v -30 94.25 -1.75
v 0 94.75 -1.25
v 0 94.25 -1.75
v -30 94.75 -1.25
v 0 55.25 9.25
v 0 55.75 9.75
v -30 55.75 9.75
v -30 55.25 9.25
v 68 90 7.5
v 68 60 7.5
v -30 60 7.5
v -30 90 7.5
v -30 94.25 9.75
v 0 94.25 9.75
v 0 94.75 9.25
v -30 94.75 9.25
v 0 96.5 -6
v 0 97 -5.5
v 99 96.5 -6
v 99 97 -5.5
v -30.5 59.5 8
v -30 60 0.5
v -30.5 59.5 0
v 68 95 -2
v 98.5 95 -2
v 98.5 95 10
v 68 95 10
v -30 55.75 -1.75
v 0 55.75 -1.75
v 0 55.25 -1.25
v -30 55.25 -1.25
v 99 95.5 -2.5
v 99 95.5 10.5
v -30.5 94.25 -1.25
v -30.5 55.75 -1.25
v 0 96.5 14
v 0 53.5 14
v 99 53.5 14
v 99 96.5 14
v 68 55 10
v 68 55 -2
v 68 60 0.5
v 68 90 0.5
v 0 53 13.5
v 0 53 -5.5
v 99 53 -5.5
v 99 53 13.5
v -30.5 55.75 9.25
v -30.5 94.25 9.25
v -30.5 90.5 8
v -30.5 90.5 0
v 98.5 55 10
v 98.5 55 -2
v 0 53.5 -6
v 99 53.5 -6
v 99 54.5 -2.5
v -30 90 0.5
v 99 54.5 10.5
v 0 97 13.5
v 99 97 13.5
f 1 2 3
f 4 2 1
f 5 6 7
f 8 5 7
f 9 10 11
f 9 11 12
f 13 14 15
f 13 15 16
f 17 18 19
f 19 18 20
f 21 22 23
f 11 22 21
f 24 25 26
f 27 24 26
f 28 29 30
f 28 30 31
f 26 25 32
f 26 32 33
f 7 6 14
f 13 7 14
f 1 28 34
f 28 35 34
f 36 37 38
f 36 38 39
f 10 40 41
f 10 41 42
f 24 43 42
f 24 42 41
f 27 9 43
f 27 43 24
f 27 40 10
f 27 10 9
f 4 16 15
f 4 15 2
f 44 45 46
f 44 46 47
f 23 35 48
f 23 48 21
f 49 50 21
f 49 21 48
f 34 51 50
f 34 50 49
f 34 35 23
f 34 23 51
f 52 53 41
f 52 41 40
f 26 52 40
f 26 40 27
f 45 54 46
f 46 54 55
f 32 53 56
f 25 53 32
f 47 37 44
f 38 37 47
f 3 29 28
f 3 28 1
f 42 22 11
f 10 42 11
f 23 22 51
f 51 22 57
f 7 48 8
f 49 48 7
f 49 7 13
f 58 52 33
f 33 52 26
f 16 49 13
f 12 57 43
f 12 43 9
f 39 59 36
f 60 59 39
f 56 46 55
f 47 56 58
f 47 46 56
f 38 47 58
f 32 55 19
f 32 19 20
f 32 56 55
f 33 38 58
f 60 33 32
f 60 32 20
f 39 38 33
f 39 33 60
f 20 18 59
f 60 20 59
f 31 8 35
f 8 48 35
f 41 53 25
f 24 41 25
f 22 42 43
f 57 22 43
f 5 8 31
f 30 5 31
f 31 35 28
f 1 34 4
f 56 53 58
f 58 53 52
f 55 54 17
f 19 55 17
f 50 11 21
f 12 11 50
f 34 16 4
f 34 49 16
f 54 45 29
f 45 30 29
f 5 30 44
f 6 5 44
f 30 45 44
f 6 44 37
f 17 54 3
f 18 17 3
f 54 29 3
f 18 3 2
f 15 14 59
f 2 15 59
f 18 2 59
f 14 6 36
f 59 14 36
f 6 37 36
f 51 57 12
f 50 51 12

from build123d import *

# Parameters (mm, degrees)
SKETCH086_W     = 44
SKETCH086_H     = 20
PAD047_DEPTH    = 99
SKETCH087_W     = 39.5
SKETCH087_H     = 11.5
PAD048_DEPTH    = 30.5
SKETCH088_W     = 30
SKETCH088_H     = 7
POCKET031_DEPTH = 129.5
SKETCH089_W     = 40
SKETCH089_H     = 12
POCKET032_DEPTH = 31
CHAMFER051_SIZE = 0.5
CHAMFER052_SIZE = 0.5
CHAMFER053_SIZE = 0.5


with BuildPart() as part:
    # Sketch086 → Pad047 (new body)
    with BuildSketch(Plane.YZ):
        Rectangle(SKETCH086_W, SKETCH086_H)
    extrude(amount=PAD047_DEPTH)

    # Sketch087 (on Face5 of Pad047) → Pad048 (join)
    with BuildSketch(Plane(origin=(0, 0, 0), x_dir=(0, 1, 0), z_dir=(-1, 0, 0))):
        Rectangle(SKETCH087_W, SKETCH087_H)
    extrude(amount=PAD048_DEPTH)

    # Sketch088 (on Face5 of Pad048) → Pocket031 (cut)
    with BuildSketch(Plane.YZ.offset(99)):
        Rectangle(SKETCH088_W, SKETCH088_H)
    extrude(amount=-POCKET031_DEPTH, mode=Mode.SUBTRACT)

    # Sketch089 (on Face5 of Pocket031) → Pocket032 (cut)
    with BuildSketch(Plane.YZ.offset(99)):
        Rectangle(SKETCH089_W, SKETCH089_H)
    extrude(amount=-POCKET032_DEPTH, mode=Mode.SUBTRACT)

    # Chamfer051
    chamfer051_edges = [part.edges().sort_by_distance(p)[0] for p in [
        (-30.5, 0, -5.75),
        (-30.5, -19.75, 0),
        (-30.5, 19.75, 0),
        (-30.5, 0, 5.75),
        (-30.5, -15, 0),
        (-30.5, 0, -3.5),
        (-30.5, 15, 0),
        (-30.5, 0, 3.5),
        (-15.25, 19.75, 5.75),
        (-15.25, -19.75, 5.75),
        (-15.25, 19.75, -5.75),
        (-15.25, -19.75, -5.75),
    ]]
    chamfer(chamfer051_edges, length=CHAMFER051_SIZE)

    # Chamfer052
    chamfer052_edges = [part.edges().sort_by_distance(p)[0] for p in [
        (99, 0, 6),
        (99, -20, 0),
        (99, 0, -6),
        (99, 20, 0),
    ]]
    chamfer(chamfer052_edges, length=CHAMFER052_SIZE)

    # Chamfer053
    chamfer053_edges = [part.edges().sort_by_distance(p)[0] for p in [
        (49.5, -22, 10),
        (49.5, -22, -10),
        (49.5, 22, 10),
        (49.5, 22, -10),
    ]]
    chamfer(chamfer053_edges, length=CHAMFER053_SIZE)


with BuildPart() as part_1:
    # Body016 placement: moved
    add(part.part.moved(Location((0, 75, 4))))


solid = part_1.part
